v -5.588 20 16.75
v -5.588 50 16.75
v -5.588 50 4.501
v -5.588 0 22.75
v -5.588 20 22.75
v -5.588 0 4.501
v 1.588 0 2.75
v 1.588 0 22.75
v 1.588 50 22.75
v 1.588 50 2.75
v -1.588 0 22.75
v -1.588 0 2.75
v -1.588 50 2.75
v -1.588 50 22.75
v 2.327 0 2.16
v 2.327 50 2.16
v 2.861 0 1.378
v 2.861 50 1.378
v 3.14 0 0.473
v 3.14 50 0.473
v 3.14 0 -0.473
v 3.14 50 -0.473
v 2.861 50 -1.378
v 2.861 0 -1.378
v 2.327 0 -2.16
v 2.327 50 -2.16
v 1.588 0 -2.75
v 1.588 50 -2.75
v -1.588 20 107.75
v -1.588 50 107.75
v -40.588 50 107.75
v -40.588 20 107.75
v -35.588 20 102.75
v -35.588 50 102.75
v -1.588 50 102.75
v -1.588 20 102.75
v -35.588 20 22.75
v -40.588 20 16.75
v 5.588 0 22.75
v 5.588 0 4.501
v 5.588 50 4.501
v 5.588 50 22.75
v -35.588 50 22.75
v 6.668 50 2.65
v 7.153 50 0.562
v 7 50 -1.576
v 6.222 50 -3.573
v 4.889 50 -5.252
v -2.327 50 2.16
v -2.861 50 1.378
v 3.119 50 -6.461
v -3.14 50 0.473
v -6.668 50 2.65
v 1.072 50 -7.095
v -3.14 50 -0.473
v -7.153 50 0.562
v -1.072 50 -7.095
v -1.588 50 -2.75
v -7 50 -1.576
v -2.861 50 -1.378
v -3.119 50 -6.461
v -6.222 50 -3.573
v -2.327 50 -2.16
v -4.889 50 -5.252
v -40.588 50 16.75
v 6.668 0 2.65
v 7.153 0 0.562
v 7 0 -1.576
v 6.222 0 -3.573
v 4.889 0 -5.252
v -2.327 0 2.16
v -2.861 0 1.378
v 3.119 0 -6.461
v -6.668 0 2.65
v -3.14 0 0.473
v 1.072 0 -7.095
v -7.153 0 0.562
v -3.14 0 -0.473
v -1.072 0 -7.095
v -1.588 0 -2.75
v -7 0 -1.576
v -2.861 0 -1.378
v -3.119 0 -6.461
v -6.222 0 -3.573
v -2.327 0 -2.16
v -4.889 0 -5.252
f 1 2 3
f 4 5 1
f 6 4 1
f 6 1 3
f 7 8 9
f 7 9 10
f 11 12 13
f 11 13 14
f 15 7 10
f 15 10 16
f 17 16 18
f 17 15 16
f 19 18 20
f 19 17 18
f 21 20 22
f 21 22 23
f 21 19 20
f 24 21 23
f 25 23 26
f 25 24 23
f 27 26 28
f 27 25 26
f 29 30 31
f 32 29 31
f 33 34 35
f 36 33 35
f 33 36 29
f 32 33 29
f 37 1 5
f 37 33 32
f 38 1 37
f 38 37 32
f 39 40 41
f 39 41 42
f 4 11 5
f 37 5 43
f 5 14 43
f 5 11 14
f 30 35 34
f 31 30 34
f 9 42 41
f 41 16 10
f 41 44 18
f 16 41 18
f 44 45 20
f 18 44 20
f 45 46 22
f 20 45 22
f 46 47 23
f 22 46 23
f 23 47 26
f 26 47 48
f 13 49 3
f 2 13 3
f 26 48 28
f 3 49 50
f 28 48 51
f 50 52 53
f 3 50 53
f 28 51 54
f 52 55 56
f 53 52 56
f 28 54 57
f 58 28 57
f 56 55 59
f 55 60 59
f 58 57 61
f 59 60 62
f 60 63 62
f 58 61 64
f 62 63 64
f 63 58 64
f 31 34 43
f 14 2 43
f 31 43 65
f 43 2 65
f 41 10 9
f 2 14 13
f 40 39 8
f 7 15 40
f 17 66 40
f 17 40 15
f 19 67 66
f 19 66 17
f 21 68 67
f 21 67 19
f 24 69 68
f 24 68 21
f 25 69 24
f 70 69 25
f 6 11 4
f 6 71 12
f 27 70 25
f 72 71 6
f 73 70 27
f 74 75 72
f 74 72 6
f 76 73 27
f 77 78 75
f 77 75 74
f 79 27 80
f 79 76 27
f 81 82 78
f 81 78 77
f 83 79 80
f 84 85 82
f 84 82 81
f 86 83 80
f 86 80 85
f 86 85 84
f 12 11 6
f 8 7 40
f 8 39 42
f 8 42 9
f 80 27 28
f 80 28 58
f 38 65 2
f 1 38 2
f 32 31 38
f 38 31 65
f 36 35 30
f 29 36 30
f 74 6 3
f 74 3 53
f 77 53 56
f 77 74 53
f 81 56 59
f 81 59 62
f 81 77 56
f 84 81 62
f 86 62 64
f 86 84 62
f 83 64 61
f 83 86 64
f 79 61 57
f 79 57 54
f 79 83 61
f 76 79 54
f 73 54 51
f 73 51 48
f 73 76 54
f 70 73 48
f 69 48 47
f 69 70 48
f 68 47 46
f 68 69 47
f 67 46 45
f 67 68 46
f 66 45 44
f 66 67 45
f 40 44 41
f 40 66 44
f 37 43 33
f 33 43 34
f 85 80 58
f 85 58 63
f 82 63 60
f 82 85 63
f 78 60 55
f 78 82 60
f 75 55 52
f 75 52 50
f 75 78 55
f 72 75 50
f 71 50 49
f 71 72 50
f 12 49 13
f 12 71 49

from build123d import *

# Parameters (mm, degrees)
BOSS_EXTRUDE1_DEPTH = 50
BOSS_EXTRUDE2_DEPTH = 30


with BuildPart() as part:
    # Sketch1 → Boss-Extrude1 (new body)
    with BuildSketch(Plane(origin=(0, 0, 0), x_dir=(1, 0, 0), z_dir=(0, 1, 0))):
        with BuildLine():
            Line((-1.5875, -2.749630657), (-1.5875, -22.749630657))
            Line((-1.5875, -22.749630657), (-5.5875, -22.749630657))
            Line((-5.5875, -22.749630657), (-5.5875, -4.501163044))
            ThreePointArc((-5.5875, -4.501163044), (0, 7.175), (5.5875, -4.501163044))
            Line((5.5875, -4.501163044), (5.5875, -22.749630657))
            Line((5.5875, -22.749630657), (1.5875, -22.749630657))
            Line((1.5875, -22.749630657), (1.5875, -2.749630657))
            ThreePointArc((1.5875, -2.749630657), (3.175, 0), (1.5875, 2.749630657))
            Line((1.5875, 2.749630657), (-1.5875, 2.749630657))
            ThreePointArc((-1.5875, 2.749630657), (-3.175, 0), (-1.5875, -2.749630657))
        make_face()
    extrude(amount=BOSS_EXTRUDE1_DEPTH)

    # Sketch5 → Boss-Extrude2 (add)
    with BuildSketch(Plane(origin=(0, 50, 0), x_dir=(1, 0, 0), z_dir=(0, 1, 0))):
        Polygon((-5.5875, -22.749630657), (-35.5875, -22.749630657), (-35.5875, -102.749630657), (-1.5875, -102.749630657), (-1.5875, -107.749630657), (-40.5875, -107.749630657), (-40.5875, -16.749630657), (-5.5875, -16.749630657), align=None)
    extrude(amount=-BOSS_EXTRUDE2_DEPTH)


solid = part.part
